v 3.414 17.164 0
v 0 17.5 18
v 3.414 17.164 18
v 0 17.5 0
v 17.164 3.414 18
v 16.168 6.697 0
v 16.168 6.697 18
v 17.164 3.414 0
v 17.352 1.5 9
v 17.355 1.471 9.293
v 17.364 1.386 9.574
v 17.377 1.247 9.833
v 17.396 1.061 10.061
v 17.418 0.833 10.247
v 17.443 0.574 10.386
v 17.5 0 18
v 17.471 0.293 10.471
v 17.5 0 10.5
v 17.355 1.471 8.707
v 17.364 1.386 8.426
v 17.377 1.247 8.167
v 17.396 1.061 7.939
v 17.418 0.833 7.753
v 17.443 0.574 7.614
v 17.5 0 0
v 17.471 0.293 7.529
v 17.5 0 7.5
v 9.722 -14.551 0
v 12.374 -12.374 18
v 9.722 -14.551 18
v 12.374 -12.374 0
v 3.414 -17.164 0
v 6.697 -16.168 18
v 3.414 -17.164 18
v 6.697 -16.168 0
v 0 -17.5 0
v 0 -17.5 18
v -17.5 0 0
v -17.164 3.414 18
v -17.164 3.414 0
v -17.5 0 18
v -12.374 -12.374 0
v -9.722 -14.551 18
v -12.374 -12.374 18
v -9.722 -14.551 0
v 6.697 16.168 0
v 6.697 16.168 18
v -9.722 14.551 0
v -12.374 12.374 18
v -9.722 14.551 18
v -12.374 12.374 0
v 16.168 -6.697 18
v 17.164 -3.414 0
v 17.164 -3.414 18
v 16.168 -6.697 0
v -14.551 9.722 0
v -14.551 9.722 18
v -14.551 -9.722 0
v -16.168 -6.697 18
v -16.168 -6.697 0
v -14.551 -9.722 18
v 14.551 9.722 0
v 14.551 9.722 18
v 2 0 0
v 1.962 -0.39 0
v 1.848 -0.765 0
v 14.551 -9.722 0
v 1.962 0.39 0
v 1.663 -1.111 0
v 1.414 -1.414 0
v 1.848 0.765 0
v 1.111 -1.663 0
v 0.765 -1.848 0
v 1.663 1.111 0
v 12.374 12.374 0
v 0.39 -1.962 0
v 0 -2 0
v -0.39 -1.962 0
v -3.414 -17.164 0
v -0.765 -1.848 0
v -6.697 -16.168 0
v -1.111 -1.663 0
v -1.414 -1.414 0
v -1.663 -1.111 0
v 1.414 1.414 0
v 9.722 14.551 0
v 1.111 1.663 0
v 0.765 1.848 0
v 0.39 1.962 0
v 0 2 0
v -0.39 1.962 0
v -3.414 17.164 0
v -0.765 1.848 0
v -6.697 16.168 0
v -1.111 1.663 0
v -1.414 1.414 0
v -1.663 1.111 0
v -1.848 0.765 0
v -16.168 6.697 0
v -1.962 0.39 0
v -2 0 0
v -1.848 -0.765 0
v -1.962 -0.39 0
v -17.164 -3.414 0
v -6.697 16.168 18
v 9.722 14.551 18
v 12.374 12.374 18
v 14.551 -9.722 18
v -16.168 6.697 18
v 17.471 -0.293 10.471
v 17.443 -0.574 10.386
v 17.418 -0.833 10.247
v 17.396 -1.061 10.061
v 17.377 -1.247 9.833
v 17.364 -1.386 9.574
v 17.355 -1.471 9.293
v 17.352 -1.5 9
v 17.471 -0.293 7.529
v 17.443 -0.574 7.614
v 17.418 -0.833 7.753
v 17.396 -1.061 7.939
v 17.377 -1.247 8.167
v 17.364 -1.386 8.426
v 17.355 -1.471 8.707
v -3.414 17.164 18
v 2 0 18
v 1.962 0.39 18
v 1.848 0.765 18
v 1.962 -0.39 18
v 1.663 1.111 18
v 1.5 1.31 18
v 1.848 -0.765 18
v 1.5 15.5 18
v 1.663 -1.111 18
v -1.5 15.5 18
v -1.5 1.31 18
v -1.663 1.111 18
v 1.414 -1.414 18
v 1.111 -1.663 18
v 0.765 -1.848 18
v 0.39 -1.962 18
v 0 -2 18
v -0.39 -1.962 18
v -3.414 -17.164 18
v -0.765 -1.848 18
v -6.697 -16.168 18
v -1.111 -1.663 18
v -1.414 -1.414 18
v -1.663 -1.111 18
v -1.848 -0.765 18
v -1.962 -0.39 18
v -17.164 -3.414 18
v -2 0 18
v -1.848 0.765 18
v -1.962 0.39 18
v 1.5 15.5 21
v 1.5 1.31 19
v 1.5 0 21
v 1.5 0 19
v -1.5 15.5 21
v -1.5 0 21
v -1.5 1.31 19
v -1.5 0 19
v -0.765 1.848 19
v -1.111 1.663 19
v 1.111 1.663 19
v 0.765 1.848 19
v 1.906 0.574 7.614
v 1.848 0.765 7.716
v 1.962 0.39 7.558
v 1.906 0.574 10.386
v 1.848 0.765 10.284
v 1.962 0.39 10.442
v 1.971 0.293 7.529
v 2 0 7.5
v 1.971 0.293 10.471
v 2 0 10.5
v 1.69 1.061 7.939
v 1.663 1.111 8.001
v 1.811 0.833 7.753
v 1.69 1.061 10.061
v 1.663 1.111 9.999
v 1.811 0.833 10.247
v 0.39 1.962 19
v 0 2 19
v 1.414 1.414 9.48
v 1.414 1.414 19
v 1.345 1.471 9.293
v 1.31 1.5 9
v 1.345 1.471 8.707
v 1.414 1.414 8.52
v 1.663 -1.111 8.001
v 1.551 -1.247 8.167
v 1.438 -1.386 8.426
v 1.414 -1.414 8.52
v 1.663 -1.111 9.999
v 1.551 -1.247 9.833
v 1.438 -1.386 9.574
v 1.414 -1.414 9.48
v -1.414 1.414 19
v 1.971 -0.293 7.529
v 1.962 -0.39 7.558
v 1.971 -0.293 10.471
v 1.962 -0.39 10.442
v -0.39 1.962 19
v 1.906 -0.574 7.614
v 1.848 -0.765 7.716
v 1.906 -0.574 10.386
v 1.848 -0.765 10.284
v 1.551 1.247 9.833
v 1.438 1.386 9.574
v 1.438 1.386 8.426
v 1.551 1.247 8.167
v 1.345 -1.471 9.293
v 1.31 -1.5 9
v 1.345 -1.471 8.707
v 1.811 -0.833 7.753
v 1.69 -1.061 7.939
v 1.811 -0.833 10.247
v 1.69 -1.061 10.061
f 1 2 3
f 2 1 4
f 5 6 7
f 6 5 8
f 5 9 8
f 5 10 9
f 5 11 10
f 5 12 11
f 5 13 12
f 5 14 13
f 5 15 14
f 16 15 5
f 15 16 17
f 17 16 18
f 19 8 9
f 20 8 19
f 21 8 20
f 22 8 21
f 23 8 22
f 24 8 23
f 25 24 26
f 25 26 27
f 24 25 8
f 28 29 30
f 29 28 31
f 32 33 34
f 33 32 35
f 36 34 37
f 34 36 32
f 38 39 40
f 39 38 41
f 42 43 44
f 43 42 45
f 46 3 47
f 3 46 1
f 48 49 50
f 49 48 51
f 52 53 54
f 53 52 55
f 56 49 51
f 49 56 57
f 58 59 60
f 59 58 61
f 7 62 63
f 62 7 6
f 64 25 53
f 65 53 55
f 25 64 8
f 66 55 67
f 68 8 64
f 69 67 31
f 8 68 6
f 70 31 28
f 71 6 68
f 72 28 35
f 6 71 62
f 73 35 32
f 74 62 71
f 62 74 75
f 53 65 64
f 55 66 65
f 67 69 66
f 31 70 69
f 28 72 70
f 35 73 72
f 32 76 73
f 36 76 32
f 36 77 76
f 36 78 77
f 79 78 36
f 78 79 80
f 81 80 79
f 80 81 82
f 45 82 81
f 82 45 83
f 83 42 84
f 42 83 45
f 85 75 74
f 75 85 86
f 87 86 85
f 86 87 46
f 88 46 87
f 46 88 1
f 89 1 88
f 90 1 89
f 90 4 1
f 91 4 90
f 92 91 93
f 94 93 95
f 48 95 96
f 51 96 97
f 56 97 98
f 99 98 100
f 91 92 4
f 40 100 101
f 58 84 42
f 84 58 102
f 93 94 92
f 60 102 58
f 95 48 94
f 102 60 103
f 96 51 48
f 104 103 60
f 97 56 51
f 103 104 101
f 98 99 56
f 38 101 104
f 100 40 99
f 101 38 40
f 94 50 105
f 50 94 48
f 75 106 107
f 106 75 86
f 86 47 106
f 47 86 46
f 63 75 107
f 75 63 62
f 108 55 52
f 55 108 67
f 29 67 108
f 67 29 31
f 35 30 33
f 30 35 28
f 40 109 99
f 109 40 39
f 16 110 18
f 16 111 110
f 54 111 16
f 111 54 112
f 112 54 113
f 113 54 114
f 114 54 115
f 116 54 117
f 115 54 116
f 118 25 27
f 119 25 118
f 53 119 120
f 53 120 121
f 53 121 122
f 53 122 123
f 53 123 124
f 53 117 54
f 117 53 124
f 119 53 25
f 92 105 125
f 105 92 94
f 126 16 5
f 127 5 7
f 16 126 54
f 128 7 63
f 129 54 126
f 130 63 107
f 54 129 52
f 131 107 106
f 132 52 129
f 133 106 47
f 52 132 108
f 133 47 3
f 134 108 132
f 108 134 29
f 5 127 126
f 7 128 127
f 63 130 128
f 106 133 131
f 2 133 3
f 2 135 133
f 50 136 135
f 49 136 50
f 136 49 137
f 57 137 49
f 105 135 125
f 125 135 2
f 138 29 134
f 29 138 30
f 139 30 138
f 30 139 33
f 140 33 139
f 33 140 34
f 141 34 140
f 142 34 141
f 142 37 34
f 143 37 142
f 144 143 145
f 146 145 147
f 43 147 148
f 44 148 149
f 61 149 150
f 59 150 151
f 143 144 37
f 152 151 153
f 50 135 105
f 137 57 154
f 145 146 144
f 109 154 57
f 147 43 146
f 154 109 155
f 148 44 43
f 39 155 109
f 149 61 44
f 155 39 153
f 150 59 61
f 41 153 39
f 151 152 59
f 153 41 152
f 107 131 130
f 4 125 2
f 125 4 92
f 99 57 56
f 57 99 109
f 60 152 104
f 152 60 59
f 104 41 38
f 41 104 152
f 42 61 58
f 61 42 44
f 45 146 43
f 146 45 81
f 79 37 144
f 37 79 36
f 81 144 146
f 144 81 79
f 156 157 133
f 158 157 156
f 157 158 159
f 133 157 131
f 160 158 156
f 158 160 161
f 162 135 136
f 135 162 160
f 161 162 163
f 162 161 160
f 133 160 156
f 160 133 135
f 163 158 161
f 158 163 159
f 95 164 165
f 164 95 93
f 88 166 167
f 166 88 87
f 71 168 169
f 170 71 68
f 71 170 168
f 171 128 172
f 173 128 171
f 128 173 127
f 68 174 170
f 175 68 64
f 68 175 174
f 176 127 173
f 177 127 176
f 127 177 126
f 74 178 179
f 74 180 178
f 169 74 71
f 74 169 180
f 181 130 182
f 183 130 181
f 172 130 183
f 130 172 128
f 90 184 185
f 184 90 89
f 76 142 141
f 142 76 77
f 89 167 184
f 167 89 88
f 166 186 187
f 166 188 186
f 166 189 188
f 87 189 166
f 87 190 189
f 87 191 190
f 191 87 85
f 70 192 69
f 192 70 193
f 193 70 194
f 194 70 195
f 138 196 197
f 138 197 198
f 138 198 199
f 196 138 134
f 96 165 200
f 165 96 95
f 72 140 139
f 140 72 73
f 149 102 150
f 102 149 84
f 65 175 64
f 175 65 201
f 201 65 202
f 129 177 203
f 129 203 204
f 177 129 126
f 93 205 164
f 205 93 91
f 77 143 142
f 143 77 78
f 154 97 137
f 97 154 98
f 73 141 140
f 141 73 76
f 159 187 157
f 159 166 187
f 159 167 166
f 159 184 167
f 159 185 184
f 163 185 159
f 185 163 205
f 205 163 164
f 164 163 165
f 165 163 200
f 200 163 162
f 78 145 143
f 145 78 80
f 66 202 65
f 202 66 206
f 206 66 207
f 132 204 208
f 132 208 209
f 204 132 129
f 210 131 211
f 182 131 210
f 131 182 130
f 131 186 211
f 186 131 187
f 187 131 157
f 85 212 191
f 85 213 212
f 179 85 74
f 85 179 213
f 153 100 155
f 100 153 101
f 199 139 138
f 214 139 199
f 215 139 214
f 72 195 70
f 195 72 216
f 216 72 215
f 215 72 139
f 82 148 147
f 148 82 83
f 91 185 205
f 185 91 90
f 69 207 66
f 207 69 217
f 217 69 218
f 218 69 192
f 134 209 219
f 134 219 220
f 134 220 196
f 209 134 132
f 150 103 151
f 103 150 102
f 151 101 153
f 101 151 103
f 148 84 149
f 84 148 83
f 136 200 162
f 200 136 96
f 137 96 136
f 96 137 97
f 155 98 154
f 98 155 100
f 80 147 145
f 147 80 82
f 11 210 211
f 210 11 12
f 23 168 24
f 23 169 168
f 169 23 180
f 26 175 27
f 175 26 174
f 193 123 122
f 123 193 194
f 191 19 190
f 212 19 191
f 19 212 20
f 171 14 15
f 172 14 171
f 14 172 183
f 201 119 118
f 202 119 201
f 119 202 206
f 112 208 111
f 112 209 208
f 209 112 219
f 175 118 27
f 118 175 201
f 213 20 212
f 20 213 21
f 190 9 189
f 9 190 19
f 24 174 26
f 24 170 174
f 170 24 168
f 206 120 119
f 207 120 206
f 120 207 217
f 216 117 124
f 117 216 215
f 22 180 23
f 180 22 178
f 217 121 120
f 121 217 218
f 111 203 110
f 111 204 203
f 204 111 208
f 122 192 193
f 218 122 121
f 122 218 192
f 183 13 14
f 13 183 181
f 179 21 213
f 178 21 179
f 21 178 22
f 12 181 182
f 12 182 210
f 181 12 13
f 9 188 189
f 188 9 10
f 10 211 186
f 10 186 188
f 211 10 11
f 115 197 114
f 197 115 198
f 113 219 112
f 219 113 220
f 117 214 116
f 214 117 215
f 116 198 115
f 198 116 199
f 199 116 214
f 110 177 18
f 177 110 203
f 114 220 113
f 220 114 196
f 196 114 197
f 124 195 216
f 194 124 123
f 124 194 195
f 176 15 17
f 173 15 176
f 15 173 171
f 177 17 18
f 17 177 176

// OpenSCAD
$fn = 32;

// ----------------------------------------------------------------------
// Control knob: pointer knob
// ----------------------------------------------------------------------

// --- parameters (mm) ---
rib_w = 3;                // pointer rib width
rib_h = 4;                // pointer rib height
knob_d = 35;              // knob body diameter
knob_h = 18;              // knob body height
bore_d = 4;               // shaft bore diameter
set_d = 3;                // set screw bore diameter

rib_poke = rib_h - 1;  // rib height above the top
total_h = knob_h + rib_h - 1;  // overall height

difference() {
  union() {
    cylinder(h = knob_h, d = knob_d);
    translate([-rib_w / 2, 0, knob_h - 1])
      cube([rib_w, knob_d / 2 - 2, rib_h]);
  }
  translate([0, 0, -1]) cylinder(h = knob_h + 2, d = bore_d);
  translate([-1, 0, knob_h / 2]) rotate([0, 90, 0])
    cylinder(h = knob_d / 2 + bore_d / 2 + 2, d = set_d);}
